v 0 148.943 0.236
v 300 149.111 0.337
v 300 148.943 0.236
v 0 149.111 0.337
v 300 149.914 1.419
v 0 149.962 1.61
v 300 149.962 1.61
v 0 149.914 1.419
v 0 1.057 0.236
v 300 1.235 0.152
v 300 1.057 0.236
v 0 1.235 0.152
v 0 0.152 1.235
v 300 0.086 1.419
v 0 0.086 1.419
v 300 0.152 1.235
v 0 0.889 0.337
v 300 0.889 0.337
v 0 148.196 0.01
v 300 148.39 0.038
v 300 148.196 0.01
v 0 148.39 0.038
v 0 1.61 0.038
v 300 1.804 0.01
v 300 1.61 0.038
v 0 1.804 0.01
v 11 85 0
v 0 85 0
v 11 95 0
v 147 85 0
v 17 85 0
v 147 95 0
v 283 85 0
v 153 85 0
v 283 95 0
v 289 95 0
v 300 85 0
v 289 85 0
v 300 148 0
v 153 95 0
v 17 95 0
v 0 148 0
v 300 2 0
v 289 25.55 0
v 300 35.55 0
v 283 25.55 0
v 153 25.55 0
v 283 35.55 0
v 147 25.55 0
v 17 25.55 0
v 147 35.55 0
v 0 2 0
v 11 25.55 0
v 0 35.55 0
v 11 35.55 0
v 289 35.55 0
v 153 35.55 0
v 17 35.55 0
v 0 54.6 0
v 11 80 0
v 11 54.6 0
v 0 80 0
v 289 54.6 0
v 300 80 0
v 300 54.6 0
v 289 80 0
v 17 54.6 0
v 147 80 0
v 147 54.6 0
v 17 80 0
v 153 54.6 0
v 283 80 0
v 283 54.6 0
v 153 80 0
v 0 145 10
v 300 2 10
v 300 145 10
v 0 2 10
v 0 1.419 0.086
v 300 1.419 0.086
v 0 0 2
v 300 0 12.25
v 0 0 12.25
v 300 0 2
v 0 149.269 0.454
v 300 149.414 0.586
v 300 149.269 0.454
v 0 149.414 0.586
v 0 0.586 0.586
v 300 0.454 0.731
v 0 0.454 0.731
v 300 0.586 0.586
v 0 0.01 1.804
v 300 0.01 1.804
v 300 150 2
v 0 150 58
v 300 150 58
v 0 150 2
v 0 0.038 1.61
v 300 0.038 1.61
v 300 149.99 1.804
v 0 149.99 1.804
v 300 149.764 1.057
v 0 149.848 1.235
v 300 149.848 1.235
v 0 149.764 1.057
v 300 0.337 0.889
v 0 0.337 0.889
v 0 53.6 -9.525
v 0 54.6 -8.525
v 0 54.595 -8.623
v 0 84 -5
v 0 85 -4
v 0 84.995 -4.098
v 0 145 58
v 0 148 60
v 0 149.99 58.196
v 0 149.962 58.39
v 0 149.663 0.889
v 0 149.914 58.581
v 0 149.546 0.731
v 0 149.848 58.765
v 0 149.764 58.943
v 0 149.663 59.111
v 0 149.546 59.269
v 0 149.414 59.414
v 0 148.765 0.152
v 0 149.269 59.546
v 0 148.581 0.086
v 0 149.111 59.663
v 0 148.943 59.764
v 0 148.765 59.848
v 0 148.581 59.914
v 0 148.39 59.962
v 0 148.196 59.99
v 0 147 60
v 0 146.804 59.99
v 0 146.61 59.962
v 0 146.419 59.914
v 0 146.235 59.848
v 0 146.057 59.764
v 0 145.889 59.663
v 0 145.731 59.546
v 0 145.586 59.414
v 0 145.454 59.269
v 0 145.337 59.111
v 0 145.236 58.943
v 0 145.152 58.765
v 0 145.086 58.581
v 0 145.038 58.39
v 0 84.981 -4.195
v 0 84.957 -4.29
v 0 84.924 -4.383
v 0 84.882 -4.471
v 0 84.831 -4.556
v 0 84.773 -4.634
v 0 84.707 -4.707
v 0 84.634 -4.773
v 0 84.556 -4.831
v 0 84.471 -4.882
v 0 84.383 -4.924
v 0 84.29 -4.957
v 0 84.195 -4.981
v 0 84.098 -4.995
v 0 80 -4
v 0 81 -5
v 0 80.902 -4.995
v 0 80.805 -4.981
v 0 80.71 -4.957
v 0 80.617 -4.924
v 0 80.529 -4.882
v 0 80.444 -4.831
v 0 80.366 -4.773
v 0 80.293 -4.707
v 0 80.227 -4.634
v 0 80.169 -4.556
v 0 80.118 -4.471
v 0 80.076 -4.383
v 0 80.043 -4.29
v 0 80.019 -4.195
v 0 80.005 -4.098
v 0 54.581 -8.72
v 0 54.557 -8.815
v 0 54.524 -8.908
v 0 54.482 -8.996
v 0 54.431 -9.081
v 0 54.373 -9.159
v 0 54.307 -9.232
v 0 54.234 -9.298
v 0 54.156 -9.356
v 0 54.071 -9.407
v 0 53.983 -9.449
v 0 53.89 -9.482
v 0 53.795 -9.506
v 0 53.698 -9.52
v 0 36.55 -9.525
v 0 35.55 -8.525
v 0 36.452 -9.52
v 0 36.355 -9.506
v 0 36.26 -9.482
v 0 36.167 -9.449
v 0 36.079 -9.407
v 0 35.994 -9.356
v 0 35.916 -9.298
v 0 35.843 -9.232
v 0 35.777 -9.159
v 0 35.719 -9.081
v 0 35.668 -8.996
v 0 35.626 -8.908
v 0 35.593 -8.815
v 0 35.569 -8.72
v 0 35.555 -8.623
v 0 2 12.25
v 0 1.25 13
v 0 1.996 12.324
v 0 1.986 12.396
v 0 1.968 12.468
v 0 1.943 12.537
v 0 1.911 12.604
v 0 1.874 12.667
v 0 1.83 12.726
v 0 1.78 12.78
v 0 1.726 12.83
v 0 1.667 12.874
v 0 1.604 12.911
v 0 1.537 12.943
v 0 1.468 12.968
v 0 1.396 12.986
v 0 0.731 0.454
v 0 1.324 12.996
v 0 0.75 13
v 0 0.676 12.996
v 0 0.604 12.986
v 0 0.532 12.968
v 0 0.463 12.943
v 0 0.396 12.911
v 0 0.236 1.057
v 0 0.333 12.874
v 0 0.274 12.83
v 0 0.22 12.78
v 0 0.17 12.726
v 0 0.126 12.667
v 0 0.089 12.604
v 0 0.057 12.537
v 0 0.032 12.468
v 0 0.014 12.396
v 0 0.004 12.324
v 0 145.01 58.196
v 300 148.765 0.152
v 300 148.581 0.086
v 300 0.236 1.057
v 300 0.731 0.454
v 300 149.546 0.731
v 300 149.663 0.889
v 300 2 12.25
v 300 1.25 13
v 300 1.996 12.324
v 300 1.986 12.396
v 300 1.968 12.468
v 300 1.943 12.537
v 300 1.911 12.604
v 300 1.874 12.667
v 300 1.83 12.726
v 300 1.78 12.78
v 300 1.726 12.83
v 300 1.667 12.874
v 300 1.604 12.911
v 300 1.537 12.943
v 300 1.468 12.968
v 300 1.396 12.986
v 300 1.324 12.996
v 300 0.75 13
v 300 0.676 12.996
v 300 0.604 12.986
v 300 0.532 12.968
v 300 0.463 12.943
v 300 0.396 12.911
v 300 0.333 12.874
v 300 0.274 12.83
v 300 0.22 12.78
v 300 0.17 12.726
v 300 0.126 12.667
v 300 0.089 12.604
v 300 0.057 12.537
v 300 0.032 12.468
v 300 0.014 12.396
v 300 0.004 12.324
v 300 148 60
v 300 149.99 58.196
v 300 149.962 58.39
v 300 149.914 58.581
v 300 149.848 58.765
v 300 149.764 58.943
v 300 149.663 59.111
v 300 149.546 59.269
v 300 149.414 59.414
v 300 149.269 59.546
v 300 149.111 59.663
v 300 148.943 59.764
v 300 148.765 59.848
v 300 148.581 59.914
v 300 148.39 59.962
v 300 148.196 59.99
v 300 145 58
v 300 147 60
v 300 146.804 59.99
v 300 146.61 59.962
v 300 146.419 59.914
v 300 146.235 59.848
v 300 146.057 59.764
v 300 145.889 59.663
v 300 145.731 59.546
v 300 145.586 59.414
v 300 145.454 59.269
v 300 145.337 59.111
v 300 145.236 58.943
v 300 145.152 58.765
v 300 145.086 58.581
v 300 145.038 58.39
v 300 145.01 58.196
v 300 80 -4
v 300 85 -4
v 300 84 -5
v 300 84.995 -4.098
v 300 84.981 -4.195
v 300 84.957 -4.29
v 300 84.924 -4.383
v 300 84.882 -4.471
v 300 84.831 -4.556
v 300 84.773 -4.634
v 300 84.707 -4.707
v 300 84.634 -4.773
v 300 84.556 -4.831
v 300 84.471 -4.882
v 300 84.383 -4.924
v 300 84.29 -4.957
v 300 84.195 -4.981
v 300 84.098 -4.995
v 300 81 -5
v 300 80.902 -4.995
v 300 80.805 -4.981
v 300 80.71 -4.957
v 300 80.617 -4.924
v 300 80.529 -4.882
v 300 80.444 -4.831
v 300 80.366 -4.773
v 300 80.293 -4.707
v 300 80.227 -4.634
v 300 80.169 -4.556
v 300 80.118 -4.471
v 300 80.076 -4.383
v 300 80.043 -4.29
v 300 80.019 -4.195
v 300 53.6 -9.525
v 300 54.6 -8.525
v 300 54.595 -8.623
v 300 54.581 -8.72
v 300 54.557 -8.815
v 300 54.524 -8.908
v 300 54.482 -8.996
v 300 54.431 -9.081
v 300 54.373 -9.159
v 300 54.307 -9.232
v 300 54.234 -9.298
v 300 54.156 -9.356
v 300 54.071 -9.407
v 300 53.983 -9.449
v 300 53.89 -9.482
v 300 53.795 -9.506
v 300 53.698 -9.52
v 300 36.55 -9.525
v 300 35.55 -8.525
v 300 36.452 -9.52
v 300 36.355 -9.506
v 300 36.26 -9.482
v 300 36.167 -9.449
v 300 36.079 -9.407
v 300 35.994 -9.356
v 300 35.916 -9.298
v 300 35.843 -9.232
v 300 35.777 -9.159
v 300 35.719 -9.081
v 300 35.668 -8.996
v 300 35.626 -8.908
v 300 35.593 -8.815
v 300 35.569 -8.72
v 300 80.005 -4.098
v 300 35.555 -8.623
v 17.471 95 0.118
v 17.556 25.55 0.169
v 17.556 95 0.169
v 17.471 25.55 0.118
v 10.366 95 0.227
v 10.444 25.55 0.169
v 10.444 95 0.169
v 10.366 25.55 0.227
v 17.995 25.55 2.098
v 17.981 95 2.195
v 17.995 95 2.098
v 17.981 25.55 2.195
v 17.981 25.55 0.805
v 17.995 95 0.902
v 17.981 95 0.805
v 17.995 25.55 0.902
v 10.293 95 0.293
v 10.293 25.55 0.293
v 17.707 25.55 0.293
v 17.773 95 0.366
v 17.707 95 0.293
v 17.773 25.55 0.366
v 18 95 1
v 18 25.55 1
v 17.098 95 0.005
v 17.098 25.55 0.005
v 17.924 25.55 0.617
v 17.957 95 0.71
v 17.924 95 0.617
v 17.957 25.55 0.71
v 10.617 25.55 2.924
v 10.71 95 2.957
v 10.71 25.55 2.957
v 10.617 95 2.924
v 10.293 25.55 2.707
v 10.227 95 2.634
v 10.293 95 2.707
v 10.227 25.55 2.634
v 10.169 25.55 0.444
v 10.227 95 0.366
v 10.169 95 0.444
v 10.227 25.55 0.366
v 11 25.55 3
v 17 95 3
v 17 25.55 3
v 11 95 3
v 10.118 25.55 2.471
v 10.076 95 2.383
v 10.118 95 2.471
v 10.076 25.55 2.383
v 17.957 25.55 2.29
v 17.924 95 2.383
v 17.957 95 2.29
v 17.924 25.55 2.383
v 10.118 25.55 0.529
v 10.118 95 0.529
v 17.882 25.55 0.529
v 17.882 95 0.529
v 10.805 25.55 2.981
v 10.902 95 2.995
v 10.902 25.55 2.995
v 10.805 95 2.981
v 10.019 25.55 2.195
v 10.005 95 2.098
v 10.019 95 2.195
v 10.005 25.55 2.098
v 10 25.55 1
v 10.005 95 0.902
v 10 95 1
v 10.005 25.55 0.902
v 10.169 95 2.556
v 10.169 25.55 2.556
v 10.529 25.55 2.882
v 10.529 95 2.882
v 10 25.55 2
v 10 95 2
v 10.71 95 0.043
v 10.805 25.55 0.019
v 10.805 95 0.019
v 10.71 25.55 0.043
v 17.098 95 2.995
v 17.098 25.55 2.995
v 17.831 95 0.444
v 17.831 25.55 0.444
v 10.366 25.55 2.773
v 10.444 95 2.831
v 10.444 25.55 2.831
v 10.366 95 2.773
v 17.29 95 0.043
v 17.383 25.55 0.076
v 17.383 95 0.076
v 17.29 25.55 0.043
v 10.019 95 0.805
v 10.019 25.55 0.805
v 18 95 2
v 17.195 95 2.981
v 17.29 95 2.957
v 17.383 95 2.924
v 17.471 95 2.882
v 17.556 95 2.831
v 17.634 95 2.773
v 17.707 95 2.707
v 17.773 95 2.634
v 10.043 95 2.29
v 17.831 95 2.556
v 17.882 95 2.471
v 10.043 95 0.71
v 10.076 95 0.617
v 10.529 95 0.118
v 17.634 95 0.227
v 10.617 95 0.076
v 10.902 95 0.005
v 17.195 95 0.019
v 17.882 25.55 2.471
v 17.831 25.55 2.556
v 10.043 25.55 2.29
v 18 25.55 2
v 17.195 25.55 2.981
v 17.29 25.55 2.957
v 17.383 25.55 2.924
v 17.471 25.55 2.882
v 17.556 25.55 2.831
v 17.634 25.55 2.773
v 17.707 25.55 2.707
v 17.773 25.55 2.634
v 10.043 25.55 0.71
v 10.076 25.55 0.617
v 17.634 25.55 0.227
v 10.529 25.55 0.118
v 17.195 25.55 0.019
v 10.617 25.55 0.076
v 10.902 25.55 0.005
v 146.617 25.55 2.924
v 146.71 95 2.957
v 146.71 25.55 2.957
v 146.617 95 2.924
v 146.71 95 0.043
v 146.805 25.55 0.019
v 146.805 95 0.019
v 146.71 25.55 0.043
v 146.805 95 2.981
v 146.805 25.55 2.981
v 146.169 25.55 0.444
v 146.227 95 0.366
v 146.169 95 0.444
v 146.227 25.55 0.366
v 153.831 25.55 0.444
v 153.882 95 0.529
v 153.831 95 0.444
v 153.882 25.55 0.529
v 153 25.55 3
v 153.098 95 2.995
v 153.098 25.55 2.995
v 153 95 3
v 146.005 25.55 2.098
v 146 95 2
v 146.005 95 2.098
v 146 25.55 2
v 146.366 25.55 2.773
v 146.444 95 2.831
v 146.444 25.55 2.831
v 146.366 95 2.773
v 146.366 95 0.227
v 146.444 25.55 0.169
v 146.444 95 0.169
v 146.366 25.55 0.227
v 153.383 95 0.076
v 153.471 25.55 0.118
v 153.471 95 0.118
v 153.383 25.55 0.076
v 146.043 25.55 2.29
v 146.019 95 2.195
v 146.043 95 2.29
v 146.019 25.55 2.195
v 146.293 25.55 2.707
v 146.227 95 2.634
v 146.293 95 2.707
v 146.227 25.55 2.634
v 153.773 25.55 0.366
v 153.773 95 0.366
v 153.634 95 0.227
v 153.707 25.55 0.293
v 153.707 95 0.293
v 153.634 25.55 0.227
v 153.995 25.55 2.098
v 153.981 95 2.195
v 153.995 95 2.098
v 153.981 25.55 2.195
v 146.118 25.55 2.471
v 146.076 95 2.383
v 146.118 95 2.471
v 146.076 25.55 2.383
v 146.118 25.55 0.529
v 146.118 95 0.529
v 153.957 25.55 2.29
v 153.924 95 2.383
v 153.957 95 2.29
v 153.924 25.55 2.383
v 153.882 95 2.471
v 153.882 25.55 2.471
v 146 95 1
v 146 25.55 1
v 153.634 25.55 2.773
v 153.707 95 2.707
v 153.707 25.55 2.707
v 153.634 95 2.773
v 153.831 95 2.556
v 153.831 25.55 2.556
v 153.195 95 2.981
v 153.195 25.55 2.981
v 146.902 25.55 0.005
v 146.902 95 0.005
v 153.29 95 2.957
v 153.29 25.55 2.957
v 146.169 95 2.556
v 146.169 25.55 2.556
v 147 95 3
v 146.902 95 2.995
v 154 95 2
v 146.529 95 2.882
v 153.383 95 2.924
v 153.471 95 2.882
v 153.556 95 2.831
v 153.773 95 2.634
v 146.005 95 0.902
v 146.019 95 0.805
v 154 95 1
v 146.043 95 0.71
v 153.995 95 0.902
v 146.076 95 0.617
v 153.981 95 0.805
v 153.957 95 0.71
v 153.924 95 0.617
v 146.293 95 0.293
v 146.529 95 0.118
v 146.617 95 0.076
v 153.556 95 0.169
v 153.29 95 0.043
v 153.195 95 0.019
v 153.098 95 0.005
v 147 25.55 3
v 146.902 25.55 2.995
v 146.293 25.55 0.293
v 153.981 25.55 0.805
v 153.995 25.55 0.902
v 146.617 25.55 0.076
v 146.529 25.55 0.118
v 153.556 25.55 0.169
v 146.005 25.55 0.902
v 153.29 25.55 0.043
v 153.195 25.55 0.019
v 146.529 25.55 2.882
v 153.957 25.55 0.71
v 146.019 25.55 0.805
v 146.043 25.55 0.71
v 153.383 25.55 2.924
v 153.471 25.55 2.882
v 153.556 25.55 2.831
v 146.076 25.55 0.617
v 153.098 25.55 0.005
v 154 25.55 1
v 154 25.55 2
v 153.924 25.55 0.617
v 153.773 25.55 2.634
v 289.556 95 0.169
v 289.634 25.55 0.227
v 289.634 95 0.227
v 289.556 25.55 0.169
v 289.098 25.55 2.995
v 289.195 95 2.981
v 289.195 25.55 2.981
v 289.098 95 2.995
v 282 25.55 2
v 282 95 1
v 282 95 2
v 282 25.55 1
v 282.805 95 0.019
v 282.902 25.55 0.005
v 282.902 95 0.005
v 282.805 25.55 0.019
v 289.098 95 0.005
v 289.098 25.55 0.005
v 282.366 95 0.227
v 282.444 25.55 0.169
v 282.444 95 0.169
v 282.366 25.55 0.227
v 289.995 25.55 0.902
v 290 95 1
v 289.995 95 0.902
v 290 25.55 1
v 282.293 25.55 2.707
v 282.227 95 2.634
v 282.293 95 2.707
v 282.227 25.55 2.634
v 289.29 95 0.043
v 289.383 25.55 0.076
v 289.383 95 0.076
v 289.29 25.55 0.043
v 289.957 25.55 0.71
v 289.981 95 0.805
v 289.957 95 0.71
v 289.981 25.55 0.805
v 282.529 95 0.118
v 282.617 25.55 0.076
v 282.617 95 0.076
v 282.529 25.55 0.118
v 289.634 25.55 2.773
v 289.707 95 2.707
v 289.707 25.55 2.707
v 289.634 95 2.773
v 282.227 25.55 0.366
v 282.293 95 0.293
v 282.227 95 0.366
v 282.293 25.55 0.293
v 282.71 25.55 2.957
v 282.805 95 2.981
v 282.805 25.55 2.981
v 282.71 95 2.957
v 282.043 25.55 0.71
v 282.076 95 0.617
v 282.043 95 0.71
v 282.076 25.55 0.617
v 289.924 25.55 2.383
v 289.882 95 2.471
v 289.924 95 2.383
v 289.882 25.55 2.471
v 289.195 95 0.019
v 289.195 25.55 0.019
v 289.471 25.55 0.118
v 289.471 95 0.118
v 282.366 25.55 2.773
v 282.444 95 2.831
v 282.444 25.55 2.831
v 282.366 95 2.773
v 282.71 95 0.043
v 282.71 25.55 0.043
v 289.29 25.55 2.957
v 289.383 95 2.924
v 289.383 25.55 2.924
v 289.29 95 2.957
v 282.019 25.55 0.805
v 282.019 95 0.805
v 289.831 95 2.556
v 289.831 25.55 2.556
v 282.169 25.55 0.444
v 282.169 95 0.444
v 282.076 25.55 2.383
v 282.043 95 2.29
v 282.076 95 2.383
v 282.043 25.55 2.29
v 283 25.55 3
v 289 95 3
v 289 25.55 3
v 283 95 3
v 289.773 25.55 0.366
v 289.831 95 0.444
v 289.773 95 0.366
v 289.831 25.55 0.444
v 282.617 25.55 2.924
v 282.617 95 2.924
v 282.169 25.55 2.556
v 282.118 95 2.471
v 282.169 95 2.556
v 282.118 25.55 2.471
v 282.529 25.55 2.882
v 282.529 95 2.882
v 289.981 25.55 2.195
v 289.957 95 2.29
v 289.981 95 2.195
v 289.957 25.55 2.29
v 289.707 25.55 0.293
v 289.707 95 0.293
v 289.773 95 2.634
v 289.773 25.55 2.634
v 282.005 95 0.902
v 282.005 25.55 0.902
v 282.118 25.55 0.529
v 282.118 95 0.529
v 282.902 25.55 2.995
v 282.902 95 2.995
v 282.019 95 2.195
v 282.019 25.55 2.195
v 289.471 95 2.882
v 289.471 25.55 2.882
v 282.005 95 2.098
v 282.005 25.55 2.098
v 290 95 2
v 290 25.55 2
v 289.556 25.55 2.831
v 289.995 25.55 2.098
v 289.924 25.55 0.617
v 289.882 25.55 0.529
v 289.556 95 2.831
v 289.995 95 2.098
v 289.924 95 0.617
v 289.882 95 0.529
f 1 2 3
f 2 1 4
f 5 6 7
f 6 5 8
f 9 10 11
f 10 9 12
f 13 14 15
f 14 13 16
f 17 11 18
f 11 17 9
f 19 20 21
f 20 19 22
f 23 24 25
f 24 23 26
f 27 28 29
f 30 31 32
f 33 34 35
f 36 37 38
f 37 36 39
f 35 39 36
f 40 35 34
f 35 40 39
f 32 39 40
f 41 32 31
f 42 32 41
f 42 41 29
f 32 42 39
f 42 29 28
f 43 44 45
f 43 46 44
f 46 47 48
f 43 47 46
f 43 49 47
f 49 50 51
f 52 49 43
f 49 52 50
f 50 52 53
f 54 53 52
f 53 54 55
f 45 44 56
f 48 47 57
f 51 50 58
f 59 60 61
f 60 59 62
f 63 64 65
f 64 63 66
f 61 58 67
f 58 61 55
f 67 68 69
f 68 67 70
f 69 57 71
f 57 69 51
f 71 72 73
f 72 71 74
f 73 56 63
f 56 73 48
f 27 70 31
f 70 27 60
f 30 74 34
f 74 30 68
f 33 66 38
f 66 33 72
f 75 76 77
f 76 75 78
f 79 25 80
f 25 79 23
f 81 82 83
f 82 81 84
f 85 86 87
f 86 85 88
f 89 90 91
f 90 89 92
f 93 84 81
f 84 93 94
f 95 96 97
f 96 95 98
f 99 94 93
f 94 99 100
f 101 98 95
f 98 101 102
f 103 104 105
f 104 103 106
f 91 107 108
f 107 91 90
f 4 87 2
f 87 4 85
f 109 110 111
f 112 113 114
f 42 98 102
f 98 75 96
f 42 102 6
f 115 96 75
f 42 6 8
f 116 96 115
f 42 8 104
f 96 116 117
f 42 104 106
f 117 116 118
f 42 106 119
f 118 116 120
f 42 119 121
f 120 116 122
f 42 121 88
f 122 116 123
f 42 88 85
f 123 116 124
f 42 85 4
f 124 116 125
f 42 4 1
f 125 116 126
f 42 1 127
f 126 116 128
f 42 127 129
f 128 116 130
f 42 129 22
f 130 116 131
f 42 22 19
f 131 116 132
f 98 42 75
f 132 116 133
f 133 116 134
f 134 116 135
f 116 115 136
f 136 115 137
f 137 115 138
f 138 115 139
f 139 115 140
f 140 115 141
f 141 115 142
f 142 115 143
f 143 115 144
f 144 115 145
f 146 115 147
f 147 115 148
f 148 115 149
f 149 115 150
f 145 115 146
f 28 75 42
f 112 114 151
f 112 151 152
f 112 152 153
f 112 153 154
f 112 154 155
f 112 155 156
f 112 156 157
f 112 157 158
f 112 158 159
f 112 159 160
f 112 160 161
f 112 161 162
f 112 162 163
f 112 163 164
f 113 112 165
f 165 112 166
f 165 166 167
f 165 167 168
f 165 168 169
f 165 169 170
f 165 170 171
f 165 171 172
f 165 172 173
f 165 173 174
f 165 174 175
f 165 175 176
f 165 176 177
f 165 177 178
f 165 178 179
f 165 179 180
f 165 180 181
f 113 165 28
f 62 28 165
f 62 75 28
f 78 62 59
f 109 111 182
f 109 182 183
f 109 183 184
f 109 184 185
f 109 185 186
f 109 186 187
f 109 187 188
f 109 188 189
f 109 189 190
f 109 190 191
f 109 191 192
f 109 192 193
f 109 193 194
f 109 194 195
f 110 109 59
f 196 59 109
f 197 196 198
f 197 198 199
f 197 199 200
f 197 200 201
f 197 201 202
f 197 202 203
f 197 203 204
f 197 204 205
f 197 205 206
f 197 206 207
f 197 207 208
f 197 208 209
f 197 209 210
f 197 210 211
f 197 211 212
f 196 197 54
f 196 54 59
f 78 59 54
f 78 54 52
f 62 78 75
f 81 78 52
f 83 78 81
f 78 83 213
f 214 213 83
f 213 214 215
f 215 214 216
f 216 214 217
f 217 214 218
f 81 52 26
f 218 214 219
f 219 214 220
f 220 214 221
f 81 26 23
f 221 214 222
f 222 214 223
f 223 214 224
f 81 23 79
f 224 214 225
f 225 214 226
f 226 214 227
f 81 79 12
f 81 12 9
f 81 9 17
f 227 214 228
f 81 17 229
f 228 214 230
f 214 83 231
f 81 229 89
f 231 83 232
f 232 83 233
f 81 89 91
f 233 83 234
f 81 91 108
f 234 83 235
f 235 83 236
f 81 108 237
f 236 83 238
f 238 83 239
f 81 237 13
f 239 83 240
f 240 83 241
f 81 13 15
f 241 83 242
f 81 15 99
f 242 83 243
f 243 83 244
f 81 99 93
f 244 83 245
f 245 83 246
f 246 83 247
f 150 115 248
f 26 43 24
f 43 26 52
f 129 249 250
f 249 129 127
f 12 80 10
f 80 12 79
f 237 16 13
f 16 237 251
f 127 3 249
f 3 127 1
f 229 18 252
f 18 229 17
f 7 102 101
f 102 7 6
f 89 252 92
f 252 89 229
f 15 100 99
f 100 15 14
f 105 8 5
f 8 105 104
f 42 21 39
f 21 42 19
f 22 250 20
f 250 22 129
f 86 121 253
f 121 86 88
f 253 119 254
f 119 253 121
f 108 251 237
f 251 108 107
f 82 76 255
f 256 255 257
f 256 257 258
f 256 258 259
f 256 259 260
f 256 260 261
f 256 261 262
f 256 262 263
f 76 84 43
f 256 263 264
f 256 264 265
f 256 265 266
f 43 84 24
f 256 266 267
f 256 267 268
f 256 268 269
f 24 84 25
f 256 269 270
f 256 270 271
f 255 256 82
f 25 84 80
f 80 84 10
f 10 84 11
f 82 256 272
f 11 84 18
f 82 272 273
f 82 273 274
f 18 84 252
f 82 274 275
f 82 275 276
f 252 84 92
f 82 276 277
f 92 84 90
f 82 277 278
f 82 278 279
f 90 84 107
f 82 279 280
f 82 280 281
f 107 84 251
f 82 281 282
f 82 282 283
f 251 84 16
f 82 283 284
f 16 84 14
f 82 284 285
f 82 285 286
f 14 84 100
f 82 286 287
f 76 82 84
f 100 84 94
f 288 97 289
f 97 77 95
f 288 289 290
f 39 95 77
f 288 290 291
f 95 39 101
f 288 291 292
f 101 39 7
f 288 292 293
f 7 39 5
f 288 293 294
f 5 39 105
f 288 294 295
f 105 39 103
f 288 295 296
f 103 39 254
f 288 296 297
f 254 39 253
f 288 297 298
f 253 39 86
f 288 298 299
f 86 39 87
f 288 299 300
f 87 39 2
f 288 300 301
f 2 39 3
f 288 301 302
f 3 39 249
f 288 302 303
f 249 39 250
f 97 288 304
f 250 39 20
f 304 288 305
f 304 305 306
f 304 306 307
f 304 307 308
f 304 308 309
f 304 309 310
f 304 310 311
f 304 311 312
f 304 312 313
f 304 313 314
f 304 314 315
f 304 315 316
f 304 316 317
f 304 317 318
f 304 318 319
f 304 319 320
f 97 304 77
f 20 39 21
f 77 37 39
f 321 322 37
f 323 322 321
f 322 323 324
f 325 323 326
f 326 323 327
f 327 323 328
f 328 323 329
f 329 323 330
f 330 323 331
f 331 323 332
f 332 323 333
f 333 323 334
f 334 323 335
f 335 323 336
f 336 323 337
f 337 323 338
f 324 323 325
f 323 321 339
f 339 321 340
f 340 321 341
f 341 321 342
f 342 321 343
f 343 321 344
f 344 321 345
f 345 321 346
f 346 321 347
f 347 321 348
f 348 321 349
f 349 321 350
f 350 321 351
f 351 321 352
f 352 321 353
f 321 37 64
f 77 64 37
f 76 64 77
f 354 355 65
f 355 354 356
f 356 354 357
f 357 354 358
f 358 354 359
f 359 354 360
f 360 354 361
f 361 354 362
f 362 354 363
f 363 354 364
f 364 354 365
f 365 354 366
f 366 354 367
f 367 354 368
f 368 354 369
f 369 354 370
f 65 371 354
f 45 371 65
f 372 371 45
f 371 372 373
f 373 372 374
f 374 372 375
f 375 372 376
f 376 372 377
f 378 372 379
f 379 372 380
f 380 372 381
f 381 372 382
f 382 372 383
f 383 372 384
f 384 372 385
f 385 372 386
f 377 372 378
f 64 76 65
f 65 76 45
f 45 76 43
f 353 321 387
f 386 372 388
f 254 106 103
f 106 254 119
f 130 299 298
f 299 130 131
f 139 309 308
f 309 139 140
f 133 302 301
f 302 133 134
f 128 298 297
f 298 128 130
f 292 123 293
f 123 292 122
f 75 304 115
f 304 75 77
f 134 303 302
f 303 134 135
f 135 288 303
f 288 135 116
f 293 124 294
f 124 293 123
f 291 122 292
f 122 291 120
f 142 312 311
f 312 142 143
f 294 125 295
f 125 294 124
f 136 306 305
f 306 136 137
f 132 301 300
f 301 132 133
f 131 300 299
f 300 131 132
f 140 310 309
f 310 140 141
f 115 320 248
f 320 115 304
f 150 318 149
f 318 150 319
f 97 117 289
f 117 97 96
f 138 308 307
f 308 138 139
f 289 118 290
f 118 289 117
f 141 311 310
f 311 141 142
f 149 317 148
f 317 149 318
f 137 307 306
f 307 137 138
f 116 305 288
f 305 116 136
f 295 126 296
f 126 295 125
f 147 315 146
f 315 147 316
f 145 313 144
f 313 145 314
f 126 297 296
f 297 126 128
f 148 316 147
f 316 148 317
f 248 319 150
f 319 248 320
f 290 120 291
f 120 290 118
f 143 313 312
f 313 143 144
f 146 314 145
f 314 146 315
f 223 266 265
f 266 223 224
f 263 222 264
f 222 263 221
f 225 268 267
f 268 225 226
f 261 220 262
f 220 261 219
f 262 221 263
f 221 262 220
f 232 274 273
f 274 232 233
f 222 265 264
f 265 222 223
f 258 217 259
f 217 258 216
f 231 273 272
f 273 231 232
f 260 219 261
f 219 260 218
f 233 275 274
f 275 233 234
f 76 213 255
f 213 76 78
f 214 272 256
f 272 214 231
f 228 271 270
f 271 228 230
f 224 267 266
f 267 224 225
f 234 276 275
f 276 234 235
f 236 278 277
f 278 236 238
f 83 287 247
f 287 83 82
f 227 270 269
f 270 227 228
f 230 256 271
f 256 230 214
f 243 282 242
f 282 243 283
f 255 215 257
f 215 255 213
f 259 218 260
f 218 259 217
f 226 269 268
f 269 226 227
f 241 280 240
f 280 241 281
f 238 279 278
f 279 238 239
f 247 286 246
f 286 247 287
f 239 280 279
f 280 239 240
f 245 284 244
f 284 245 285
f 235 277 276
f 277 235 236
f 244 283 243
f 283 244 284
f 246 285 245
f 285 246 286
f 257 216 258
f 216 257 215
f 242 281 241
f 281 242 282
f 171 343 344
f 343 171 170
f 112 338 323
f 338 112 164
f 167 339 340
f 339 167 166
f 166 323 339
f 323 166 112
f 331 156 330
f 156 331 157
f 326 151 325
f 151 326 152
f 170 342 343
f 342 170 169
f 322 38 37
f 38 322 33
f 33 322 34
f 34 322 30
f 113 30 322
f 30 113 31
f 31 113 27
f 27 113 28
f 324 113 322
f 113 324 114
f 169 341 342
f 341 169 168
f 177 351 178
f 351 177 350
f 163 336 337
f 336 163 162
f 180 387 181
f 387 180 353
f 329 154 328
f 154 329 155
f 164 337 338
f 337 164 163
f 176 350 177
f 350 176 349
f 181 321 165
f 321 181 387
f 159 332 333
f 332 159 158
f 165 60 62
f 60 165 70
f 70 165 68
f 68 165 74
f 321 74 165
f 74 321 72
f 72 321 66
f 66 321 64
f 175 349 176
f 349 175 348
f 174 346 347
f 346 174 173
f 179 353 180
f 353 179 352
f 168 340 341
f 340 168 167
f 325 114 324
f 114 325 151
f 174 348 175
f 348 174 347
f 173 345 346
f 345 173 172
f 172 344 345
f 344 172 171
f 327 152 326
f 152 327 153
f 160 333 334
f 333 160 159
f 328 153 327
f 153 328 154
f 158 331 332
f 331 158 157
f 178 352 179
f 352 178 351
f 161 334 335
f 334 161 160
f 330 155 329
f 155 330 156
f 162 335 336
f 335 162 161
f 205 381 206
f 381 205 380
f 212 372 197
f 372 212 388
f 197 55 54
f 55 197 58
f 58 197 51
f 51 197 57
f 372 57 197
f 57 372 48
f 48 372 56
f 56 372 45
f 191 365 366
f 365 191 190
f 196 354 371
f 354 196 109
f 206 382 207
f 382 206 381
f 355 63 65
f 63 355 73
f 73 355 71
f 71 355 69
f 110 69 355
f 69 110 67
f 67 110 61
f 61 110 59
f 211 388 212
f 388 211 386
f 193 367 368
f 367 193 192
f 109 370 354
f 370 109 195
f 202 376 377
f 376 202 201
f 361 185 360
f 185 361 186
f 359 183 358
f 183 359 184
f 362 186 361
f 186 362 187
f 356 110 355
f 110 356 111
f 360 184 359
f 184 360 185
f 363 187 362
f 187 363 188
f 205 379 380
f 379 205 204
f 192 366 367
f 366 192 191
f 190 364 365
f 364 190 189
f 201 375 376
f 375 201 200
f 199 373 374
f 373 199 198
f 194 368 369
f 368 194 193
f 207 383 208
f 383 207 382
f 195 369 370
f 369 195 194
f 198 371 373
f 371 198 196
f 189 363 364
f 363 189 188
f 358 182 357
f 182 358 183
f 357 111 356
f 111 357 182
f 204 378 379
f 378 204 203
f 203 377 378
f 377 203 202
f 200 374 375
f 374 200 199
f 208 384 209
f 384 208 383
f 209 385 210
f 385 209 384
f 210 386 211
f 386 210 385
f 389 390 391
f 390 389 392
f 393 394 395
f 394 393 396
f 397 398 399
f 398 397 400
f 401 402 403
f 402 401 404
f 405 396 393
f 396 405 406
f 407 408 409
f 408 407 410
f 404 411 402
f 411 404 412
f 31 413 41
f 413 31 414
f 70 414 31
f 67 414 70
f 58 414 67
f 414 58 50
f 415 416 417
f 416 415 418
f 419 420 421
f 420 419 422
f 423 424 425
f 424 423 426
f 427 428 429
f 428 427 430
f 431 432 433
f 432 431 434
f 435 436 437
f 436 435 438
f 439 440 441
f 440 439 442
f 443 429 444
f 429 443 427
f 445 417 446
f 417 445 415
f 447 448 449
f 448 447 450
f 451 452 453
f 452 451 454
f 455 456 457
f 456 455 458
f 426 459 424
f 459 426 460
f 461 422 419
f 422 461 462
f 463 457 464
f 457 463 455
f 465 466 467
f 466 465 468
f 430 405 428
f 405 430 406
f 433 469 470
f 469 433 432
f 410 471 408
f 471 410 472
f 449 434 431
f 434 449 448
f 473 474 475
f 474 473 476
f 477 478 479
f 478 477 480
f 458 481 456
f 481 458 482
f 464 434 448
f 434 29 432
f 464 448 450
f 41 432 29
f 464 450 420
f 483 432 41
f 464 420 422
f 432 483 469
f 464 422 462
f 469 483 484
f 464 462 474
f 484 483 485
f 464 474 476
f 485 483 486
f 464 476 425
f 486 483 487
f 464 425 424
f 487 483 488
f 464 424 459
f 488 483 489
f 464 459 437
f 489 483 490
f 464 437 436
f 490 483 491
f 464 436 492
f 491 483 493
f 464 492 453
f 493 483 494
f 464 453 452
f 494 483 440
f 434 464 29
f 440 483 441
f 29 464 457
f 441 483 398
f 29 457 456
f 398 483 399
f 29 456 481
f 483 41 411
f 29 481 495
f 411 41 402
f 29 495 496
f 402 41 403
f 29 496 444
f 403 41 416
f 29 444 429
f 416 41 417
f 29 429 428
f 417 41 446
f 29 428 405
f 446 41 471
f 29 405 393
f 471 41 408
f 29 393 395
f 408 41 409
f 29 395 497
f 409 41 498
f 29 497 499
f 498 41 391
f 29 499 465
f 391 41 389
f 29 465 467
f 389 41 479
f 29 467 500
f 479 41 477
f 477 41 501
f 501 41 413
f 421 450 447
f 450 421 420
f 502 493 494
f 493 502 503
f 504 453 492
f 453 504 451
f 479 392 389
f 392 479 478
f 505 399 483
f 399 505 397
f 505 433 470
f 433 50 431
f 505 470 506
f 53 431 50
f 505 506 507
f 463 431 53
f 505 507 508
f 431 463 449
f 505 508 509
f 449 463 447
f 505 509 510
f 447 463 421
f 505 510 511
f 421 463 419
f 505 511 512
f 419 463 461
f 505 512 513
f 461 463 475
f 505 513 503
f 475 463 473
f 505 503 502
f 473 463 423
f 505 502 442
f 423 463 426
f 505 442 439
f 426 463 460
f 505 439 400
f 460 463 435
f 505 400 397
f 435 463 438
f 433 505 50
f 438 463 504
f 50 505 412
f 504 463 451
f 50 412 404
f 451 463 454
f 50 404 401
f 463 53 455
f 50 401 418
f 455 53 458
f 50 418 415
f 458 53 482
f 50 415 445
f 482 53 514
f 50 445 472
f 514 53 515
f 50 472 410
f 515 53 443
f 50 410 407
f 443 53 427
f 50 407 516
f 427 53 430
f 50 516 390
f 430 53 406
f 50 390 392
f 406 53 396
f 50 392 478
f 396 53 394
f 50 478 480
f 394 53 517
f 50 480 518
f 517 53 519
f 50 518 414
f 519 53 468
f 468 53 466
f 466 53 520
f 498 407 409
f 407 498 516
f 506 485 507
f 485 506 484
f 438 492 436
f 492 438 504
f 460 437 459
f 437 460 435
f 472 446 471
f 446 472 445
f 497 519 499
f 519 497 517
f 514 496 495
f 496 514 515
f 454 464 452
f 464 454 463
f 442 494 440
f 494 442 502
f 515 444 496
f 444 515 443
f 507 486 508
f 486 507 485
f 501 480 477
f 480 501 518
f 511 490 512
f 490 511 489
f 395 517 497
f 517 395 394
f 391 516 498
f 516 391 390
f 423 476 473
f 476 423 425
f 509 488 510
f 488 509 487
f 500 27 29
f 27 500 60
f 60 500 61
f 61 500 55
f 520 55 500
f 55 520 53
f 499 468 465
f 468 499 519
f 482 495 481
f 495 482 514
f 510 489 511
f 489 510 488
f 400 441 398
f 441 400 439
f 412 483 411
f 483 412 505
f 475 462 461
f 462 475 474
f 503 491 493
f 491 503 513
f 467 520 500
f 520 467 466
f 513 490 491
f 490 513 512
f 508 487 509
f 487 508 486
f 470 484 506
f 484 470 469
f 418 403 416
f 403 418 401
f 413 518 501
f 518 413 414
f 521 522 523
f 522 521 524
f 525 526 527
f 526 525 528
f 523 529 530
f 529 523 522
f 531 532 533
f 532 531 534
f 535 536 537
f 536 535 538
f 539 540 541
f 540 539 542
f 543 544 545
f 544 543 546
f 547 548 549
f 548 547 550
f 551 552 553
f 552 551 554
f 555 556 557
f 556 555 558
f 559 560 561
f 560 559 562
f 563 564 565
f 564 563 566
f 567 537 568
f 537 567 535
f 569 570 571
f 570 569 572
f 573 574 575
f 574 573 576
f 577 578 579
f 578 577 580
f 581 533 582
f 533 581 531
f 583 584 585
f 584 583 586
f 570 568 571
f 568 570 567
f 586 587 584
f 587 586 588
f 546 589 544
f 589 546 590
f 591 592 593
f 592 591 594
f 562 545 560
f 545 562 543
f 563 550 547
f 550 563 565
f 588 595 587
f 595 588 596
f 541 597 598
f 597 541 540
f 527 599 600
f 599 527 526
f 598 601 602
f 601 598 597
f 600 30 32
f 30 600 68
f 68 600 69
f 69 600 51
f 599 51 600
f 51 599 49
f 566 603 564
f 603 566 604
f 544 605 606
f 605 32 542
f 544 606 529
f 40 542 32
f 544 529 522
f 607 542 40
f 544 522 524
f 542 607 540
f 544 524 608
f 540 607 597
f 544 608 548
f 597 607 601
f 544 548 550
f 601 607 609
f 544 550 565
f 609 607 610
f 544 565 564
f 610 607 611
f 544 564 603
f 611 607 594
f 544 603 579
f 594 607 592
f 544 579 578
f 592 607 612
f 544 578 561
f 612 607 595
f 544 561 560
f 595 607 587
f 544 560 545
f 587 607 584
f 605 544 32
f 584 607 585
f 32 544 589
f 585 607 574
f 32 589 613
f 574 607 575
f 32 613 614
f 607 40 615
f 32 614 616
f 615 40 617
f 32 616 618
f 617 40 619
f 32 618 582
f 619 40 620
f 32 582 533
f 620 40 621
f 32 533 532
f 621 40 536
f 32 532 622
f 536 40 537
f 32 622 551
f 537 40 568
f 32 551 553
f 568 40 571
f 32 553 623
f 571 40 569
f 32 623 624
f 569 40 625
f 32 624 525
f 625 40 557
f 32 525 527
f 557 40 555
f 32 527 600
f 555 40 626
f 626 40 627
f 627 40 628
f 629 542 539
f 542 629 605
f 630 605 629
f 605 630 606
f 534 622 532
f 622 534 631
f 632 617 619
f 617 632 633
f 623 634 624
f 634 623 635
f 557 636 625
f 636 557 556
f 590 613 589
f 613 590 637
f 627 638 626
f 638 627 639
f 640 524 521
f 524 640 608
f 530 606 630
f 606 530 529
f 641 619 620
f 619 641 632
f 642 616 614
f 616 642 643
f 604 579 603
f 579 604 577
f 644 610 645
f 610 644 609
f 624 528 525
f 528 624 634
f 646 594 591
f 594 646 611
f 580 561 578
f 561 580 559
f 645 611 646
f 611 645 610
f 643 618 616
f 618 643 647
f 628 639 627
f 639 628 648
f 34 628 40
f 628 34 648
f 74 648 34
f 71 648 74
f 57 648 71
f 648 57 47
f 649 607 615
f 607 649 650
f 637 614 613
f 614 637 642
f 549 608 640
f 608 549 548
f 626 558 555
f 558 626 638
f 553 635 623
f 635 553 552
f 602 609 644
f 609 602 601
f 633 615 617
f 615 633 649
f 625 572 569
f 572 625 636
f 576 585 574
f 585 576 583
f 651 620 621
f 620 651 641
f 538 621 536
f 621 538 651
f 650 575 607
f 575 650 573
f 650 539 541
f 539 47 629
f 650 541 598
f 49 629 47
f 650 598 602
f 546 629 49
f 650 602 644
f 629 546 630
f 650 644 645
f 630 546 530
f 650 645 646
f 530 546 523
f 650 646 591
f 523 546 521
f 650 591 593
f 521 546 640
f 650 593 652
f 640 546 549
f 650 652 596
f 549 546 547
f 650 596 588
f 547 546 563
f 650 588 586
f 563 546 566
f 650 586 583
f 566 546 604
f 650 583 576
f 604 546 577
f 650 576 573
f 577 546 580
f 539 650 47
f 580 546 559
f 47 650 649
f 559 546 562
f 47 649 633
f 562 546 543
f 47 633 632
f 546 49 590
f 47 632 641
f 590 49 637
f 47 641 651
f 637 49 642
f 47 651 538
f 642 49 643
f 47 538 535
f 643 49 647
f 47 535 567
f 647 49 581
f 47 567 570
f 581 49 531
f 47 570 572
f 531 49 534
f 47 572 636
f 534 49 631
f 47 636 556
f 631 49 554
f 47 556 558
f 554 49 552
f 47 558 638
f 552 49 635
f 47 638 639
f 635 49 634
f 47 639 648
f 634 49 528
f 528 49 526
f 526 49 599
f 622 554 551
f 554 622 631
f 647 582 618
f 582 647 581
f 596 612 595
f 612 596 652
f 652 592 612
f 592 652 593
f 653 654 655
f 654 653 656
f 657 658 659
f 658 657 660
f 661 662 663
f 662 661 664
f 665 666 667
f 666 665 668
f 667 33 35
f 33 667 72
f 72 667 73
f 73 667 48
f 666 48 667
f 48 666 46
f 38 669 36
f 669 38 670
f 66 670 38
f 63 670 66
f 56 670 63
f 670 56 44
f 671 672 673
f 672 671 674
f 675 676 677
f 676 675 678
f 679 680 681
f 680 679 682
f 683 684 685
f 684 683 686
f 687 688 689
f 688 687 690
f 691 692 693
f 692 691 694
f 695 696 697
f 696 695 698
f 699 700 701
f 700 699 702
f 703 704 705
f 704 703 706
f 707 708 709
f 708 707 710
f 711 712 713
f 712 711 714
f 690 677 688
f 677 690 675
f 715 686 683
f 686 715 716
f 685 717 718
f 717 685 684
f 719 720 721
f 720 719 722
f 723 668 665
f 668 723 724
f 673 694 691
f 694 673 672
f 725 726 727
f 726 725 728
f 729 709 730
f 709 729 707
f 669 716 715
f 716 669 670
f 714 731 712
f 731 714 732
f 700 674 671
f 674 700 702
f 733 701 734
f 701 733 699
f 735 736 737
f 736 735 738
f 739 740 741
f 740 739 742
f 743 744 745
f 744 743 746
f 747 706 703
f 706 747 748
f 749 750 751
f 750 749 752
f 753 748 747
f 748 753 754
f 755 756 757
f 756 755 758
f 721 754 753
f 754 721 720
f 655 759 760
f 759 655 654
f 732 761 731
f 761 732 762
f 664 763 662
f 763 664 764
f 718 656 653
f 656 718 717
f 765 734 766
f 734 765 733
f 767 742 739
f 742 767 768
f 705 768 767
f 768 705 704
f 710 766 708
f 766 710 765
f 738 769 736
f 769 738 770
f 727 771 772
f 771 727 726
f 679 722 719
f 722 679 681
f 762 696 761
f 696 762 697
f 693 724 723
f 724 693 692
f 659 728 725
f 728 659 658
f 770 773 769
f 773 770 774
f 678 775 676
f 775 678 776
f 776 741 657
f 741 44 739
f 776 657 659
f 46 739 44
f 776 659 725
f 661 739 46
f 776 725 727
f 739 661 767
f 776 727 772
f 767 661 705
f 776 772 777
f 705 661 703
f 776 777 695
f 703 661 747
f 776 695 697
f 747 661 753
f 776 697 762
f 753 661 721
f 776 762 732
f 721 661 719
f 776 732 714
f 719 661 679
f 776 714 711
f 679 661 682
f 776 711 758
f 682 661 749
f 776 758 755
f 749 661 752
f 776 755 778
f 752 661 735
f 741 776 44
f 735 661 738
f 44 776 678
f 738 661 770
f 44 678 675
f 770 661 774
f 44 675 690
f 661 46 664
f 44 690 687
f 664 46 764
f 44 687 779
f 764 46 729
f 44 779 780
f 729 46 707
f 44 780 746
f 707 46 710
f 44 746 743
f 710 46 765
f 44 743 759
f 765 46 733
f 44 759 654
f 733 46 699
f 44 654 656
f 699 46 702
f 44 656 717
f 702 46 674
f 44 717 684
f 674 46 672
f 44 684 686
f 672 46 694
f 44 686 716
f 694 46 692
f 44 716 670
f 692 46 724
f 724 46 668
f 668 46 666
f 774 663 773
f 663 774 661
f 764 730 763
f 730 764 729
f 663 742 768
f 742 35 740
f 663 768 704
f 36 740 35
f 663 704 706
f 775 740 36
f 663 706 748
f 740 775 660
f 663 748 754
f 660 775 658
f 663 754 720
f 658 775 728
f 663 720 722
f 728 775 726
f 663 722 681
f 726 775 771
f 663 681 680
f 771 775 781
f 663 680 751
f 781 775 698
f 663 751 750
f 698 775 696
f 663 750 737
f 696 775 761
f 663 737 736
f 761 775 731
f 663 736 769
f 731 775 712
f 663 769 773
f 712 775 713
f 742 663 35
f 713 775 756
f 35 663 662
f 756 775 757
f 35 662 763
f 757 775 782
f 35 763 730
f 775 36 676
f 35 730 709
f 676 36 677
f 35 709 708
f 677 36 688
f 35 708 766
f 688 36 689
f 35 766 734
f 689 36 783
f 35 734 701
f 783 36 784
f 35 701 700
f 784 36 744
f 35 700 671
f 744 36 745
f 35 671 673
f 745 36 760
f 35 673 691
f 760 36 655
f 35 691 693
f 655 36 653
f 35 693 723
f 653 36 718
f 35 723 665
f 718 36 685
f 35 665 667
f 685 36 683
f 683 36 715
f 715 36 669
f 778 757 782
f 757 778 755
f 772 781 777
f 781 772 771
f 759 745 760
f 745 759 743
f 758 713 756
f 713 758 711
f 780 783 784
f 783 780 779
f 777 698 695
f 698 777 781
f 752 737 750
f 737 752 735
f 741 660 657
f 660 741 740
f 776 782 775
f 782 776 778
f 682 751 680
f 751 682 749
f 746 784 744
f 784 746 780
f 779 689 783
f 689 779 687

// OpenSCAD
// file: 72-inch-cosco-profile.scad
// 72-inch Cosco shelf profile.
//
// Overrides the bar / front-lip dimensions in bar_shelf.scad to fit a
// 72-inch Cosco shelving rail. Include this BEFORE bar_shelf.scad in any
// wrapper that should use the Cosco profile.
border_ridge_override     = 25.4;    // 1"
border_depth_override     = 19.05;   // 3/4"
border_height_override    = 9.525;   // 3/8"
rear_wall_height_override = 5;       // shorter rear lip than 77-inch industrial
// main file
// 300mm-wide 72-inch Cosco shelf — see bar_shelf.scad for the design.
include <72-inch-cosco-profile.scad>
shelf_width_override = 300;
include <bar_shelf.scad>
